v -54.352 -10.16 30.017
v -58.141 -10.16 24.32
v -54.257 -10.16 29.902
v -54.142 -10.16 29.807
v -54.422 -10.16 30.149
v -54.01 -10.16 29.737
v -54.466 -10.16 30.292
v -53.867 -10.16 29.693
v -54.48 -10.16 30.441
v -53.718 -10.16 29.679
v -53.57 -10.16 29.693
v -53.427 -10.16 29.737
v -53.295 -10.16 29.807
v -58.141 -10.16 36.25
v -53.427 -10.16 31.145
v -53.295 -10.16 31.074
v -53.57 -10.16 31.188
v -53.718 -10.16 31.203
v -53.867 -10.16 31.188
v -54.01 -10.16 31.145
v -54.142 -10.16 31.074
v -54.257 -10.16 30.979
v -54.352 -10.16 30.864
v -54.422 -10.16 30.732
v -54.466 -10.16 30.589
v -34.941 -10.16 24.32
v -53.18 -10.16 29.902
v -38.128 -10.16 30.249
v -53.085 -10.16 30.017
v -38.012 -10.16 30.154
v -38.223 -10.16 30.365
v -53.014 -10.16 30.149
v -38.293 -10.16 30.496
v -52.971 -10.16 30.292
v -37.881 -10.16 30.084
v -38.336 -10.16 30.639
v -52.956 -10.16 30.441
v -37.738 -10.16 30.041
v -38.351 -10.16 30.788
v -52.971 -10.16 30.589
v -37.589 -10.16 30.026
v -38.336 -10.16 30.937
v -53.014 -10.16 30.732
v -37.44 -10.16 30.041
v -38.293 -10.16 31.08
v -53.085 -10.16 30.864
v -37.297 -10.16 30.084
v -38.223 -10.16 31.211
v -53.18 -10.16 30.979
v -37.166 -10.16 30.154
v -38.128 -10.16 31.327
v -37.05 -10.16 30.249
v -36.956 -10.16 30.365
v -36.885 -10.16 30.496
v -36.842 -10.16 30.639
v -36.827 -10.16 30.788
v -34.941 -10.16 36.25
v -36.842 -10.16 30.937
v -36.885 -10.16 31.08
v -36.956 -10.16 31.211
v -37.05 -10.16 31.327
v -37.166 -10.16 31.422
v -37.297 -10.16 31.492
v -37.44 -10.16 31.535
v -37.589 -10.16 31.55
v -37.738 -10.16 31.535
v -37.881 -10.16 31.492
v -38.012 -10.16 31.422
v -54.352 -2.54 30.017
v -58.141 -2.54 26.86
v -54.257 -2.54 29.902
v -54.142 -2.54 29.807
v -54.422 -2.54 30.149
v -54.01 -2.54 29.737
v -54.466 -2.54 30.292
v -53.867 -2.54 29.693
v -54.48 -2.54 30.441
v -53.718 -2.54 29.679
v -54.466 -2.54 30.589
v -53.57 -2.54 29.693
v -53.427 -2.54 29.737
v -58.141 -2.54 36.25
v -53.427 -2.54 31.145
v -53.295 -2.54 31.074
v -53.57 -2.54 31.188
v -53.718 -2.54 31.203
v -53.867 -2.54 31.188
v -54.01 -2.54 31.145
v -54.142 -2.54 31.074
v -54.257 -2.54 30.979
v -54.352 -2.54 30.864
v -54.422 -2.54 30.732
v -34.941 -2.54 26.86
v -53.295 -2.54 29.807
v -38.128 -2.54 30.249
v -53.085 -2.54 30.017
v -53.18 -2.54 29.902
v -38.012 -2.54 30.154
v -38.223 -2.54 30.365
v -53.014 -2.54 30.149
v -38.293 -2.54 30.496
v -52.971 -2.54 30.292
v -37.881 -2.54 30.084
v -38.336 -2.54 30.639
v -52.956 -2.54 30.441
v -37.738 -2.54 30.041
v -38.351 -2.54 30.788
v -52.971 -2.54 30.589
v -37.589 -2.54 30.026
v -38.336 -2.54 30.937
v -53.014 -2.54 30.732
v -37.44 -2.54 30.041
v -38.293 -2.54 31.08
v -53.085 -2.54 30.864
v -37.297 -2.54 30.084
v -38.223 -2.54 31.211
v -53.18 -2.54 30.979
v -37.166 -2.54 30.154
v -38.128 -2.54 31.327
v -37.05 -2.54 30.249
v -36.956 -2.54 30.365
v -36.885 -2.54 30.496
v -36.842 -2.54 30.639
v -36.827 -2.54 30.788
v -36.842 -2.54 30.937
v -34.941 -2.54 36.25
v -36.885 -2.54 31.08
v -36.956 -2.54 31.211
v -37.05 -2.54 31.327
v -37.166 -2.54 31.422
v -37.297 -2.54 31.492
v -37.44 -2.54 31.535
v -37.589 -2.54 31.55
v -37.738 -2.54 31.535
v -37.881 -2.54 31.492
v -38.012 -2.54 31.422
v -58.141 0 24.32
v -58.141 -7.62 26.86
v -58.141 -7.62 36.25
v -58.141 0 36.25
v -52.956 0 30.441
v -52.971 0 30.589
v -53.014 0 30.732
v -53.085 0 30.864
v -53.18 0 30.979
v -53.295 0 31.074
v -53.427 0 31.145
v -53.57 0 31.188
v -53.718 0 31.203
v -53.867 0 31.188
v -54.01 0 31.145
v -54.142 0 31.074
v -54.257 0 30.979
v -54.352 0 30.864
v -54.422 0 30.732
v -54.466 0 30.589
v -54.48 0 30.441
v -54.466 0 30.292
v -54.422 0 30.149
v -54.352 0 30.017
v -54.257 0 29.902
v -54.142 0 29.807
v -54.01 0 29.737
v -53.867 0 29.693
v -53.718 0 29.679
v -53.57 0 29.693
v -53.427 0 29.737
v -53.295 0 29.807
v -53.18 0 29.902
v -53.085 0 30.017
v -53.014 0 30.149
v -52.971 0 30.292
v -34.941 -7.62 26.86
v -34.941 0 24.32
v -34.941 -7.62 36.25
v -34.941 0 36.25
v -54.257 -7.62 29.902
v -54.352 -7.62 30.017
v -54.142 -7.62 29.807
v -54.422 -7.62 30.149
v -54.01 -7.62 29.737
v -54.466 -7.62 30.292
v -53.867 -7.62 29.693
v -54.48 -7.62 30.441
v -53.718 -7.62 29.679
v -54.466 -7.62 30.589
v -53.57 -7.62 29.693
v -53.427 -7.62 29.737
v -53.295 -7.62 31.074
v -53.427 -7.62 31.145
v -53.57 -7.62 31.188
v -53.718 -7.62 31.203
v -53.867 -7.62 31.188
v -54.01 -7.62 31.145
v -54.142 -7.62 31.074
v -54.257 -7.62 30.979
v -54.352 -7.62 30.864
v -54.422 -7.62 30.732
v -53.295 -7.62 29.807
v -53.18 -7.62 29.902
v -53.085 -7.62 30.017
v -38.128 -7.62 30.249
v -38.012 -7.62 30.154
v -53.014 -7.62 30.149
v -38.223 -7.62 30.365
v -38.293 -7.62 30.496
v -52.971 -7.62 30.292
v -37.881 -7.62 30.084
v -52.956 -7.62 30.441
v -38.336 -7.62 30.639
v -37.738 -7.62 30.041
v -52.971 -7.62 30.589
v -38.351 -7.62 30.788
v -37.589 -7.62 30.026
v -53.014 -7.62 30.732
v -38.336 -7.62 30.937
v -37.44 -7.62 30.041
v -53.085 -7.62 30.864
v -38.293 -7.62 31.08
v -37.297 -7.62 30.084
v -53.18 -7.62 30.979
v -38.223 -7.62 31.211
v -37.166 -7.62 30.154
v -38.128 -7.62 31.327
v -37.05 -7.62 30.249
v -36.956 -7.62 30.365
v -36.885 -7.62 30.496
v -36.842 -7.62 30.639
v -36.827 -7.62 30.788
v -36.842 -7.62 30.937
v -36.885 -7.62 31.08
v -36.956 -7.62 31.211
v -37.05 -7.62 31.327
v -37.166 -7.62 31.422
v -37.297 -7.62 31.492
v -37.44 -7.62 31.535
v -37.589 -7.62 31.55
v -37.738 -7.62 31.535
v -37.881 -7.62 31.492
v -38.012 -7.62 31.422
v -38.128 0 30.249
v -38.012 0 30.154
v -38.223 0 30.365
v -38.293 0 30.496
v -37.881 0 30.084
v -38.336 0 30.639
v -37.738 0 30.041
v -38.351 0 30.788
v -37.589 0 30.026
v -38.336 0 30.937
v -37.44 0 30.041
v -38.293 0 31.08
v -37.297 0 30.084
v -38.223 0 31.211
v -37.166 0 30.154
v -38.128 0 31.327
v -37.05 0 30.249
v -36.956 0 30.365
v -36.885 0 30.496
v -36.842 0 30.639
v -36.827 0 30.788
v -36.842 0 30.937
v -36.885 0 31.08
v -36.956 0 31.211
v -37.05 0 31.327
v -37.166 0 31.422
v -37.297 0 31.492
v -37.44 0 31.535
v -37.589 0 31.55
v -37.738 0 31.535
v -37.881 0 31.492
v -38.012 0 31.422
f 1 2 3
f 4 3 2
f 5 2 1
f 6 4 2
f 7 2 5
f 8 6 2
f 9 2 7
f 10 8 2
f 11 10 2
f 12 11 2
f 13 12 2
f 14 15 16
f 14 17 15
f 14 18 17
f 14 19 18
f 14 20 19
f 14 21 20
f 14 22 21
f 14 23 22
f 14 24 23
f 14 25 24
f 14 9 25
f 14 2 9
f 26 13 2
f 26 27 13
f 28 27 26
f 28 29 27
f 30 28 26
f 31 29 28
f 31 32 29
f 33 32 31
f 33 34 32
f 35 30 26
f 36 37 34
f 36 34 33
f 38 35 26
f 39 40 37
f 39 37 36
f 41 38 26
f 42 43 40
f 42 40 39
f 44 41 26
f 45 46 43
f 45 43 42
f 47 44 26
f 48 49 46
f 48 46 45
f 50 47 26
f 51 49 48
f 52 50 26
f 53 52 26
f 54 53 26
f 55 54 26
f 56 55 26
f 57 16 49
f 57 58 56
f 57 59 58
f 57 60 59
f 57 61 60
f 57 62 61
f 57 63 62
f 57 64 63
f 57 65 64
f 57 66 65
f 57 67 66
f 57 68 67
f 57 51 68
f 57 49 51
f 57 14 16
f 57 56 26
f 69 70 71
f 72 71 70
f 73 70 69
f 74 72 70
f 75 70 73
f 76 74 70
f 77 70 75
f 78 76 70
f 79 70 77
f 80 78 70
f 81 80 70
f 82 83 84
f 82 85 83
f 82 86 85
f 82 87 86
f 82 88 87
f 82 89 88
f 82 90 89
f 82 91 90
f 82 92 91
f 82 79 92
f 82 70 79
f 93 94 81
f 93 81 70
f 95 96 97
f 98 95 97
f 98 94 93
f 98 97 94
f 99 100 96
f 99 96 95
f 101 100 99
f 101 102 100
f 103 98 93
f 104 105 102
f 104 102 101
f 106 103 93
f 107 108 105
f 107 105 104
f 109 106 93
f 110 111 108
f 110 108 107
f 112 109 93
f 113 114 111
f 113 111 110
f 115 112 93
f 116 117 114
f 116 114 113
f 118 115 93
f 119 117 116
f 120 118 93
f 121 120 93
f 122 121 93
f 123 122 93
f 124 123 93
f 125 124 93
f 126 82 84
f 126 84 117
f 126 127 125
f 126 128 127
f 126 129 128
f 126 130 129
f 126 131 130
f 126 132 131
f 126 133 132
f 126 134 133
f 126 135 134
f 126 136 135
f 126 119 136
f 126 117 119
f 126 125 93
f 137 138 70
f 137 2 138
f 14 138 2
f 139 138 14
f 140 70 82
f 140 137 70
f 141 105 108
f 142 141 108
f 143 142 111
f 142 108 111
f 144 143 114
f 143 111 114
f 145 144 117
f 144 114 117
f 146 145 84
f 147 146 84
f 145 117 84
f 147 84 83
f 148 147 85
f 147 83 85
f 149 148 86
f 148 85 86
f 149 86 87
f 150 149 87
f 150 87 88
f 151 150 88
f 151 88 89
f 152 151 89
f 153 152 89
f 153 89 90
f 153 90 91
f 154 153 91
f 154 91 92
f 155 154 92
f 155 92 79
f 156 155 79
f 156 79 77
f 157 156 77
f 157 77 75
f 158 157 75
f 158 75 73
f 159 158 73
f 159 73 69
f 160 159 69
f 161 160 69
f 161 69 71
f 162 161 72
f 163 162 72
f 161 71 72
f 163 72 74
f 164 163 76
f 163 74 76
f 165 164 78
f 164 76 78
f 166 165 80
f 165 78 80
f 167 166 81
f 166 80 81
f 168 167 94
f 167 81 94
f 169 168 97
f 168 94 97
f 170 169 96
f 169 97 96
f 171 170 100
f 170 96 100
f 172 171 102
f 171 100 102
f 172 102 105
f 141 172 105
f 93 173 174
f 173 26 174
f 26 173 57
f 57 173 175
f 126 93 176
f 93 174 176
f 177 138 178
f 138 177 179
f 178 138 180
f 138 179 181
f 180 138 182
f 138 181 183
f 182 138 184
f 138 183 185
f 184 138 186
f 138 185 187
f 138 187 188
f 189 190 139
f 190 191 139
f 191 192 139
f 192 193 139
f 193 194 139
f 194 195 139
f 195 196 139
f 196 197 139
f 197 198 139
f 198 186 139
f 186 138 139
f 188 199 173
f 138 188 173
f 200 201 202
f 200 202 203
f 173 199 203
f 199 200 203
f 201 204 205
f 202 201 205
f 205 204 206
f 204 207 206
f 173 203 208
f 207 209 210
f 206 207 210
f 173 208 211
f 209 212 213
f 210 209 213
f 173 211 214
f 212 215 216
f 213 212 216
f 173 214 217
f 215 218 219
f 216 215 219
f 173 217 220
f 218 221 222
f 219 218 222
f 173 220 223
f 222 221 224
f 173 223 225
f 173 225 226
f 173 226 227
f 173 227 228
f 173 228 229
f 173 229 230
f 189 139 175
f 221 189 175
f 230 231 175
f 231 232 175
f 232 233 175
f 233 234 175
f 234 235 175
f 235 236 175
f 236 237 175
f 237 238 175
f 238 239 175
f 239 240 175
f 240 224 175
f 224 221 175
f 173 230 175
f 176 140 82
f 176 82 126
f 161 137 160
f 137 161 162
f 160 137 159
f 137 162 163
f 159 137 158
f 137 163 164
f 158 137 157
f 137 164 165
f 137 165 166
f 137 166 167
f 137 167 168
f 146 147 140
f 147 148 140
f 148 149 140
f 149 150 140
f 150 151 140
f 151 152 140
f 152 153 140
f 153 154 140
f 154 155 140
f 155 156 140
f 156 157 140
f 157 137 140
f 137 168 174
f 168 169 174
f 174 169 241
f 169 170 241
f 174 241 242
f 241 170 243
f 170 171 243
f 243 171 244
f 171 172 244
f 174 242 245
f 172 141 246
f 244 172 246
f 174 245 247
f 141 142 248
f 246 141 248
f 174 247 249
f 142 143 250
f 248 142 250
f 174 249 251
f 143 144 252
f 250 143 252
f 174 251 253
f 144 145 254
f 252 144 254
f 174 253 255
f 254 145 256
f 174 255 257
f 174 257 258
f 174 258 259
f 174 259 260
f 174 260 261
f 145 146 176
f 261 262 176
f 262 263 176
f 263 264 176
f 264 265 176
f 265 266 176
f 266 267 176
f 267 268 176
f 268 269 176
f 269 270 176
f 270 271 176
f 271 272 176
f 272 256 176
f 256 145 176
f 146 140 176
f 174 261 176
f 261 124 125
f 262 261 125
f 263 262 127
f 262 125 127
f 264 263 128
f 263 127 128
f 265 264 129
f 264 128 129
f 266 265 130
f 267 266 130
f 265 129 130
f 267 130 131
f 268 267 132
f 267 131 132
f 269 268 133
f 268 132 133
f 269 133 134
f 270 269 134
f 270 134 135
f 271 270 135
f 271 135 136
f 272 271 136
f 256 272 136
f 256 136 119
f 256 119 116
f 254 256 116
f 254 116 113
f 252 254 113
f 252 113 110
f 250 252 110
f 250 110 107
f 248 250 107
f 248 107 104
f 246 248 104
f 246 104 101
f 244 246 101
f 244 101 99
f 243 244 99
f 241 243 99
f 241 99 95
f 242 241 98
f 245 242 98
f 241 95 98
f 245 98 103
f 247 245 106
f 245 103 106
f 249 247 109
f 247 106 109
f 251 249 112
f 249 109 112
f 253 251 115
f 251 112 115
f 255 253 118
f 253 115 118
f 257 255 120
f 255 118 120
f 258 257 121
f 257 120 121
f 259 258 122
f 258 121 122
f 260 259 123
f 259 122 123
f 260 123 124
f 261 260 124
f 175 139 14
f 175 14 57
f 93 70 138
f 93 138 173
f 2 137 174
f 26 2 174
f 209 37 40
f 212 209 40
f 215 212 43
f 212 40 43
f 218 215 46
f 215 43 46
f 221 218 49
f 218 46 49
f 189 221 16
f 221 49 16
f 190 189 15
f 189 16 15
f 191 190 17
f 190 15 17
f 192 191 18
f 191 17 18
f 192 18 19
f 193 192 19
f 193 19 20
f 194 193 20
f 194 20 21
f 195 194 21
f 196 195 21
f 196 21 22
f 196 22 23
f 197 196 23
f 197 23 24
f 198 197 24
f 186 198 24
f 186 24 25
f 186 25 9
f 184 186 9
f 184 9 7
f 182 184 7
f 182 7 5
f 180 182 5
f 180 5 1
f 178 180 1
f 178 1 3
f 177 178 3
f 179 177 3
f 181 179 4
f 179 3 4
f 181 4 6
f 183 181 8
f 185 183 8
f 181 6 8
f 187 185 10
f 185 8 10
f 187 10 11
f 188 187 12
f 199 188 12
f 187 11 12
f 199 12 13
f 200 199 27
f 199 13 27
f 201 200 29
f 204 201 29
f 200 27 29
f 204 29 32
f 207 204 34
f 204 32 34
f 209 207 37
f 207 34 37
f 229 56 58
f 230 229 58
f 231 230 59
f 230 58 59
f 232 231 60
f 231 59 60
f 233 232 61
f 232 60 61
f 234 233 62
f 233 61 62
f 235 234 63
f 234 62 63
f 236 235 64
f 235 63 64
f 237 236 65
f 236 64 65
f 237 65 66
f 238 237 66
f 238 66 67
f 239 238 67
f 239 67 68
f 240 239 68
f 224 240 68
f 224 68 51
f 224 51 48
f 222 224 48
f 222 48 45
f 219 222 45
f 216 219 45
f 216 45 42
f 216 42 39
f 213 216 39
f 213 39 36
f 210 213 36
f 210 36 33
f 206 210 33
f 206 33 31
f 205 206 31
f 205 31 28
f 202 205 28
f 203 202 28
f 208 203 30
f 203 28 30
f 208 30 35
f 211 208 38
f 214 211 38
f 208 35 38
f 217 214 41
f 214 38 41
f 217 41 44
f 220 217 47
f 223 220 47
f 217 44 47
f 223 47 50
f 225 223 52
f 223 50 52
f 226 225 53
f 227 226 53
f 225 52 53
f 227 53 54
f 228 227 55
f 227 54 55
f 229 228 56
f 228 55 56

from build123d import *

# Parameters (mm, degrees)
F0_W     = 23.200736
F0_H     = 11.930093
F1_DEPTH = 10.16
F2_T     = -2.54
F4_D     = 1.524


with BuildPart() as f1:
    # F0 (on Front) → F1 (new body)
    with BuildSketch(Plane.XZ):
        with Locations((-46.540994, 30.285004)):
            Rectangle(F0_W, F0_H)
    extrude(amount=F1_DEPTH)

    # F2
    f2_openings = [f1.faces().sort_by_distance(p)[0] for p in [
        (-46.540994, -5.08, 36.250051),
        (-58.141362, -5.08, 30.285005),
        (-34.940626, -5.08, 30.285005),
    ]]
    offset(amount=F2_T, openings=f2_openings)

    # F4 (through all)
    with Locations(Plane(origin=(0, 0, 0), x_dir=(-1, 0, 0), z_dir=(0, 1, 0))):
        with Locations((37.589088, 30.788029), (53.718481, 30.440666)):
            Hole(F4_D / 2)


solid = f1.part
